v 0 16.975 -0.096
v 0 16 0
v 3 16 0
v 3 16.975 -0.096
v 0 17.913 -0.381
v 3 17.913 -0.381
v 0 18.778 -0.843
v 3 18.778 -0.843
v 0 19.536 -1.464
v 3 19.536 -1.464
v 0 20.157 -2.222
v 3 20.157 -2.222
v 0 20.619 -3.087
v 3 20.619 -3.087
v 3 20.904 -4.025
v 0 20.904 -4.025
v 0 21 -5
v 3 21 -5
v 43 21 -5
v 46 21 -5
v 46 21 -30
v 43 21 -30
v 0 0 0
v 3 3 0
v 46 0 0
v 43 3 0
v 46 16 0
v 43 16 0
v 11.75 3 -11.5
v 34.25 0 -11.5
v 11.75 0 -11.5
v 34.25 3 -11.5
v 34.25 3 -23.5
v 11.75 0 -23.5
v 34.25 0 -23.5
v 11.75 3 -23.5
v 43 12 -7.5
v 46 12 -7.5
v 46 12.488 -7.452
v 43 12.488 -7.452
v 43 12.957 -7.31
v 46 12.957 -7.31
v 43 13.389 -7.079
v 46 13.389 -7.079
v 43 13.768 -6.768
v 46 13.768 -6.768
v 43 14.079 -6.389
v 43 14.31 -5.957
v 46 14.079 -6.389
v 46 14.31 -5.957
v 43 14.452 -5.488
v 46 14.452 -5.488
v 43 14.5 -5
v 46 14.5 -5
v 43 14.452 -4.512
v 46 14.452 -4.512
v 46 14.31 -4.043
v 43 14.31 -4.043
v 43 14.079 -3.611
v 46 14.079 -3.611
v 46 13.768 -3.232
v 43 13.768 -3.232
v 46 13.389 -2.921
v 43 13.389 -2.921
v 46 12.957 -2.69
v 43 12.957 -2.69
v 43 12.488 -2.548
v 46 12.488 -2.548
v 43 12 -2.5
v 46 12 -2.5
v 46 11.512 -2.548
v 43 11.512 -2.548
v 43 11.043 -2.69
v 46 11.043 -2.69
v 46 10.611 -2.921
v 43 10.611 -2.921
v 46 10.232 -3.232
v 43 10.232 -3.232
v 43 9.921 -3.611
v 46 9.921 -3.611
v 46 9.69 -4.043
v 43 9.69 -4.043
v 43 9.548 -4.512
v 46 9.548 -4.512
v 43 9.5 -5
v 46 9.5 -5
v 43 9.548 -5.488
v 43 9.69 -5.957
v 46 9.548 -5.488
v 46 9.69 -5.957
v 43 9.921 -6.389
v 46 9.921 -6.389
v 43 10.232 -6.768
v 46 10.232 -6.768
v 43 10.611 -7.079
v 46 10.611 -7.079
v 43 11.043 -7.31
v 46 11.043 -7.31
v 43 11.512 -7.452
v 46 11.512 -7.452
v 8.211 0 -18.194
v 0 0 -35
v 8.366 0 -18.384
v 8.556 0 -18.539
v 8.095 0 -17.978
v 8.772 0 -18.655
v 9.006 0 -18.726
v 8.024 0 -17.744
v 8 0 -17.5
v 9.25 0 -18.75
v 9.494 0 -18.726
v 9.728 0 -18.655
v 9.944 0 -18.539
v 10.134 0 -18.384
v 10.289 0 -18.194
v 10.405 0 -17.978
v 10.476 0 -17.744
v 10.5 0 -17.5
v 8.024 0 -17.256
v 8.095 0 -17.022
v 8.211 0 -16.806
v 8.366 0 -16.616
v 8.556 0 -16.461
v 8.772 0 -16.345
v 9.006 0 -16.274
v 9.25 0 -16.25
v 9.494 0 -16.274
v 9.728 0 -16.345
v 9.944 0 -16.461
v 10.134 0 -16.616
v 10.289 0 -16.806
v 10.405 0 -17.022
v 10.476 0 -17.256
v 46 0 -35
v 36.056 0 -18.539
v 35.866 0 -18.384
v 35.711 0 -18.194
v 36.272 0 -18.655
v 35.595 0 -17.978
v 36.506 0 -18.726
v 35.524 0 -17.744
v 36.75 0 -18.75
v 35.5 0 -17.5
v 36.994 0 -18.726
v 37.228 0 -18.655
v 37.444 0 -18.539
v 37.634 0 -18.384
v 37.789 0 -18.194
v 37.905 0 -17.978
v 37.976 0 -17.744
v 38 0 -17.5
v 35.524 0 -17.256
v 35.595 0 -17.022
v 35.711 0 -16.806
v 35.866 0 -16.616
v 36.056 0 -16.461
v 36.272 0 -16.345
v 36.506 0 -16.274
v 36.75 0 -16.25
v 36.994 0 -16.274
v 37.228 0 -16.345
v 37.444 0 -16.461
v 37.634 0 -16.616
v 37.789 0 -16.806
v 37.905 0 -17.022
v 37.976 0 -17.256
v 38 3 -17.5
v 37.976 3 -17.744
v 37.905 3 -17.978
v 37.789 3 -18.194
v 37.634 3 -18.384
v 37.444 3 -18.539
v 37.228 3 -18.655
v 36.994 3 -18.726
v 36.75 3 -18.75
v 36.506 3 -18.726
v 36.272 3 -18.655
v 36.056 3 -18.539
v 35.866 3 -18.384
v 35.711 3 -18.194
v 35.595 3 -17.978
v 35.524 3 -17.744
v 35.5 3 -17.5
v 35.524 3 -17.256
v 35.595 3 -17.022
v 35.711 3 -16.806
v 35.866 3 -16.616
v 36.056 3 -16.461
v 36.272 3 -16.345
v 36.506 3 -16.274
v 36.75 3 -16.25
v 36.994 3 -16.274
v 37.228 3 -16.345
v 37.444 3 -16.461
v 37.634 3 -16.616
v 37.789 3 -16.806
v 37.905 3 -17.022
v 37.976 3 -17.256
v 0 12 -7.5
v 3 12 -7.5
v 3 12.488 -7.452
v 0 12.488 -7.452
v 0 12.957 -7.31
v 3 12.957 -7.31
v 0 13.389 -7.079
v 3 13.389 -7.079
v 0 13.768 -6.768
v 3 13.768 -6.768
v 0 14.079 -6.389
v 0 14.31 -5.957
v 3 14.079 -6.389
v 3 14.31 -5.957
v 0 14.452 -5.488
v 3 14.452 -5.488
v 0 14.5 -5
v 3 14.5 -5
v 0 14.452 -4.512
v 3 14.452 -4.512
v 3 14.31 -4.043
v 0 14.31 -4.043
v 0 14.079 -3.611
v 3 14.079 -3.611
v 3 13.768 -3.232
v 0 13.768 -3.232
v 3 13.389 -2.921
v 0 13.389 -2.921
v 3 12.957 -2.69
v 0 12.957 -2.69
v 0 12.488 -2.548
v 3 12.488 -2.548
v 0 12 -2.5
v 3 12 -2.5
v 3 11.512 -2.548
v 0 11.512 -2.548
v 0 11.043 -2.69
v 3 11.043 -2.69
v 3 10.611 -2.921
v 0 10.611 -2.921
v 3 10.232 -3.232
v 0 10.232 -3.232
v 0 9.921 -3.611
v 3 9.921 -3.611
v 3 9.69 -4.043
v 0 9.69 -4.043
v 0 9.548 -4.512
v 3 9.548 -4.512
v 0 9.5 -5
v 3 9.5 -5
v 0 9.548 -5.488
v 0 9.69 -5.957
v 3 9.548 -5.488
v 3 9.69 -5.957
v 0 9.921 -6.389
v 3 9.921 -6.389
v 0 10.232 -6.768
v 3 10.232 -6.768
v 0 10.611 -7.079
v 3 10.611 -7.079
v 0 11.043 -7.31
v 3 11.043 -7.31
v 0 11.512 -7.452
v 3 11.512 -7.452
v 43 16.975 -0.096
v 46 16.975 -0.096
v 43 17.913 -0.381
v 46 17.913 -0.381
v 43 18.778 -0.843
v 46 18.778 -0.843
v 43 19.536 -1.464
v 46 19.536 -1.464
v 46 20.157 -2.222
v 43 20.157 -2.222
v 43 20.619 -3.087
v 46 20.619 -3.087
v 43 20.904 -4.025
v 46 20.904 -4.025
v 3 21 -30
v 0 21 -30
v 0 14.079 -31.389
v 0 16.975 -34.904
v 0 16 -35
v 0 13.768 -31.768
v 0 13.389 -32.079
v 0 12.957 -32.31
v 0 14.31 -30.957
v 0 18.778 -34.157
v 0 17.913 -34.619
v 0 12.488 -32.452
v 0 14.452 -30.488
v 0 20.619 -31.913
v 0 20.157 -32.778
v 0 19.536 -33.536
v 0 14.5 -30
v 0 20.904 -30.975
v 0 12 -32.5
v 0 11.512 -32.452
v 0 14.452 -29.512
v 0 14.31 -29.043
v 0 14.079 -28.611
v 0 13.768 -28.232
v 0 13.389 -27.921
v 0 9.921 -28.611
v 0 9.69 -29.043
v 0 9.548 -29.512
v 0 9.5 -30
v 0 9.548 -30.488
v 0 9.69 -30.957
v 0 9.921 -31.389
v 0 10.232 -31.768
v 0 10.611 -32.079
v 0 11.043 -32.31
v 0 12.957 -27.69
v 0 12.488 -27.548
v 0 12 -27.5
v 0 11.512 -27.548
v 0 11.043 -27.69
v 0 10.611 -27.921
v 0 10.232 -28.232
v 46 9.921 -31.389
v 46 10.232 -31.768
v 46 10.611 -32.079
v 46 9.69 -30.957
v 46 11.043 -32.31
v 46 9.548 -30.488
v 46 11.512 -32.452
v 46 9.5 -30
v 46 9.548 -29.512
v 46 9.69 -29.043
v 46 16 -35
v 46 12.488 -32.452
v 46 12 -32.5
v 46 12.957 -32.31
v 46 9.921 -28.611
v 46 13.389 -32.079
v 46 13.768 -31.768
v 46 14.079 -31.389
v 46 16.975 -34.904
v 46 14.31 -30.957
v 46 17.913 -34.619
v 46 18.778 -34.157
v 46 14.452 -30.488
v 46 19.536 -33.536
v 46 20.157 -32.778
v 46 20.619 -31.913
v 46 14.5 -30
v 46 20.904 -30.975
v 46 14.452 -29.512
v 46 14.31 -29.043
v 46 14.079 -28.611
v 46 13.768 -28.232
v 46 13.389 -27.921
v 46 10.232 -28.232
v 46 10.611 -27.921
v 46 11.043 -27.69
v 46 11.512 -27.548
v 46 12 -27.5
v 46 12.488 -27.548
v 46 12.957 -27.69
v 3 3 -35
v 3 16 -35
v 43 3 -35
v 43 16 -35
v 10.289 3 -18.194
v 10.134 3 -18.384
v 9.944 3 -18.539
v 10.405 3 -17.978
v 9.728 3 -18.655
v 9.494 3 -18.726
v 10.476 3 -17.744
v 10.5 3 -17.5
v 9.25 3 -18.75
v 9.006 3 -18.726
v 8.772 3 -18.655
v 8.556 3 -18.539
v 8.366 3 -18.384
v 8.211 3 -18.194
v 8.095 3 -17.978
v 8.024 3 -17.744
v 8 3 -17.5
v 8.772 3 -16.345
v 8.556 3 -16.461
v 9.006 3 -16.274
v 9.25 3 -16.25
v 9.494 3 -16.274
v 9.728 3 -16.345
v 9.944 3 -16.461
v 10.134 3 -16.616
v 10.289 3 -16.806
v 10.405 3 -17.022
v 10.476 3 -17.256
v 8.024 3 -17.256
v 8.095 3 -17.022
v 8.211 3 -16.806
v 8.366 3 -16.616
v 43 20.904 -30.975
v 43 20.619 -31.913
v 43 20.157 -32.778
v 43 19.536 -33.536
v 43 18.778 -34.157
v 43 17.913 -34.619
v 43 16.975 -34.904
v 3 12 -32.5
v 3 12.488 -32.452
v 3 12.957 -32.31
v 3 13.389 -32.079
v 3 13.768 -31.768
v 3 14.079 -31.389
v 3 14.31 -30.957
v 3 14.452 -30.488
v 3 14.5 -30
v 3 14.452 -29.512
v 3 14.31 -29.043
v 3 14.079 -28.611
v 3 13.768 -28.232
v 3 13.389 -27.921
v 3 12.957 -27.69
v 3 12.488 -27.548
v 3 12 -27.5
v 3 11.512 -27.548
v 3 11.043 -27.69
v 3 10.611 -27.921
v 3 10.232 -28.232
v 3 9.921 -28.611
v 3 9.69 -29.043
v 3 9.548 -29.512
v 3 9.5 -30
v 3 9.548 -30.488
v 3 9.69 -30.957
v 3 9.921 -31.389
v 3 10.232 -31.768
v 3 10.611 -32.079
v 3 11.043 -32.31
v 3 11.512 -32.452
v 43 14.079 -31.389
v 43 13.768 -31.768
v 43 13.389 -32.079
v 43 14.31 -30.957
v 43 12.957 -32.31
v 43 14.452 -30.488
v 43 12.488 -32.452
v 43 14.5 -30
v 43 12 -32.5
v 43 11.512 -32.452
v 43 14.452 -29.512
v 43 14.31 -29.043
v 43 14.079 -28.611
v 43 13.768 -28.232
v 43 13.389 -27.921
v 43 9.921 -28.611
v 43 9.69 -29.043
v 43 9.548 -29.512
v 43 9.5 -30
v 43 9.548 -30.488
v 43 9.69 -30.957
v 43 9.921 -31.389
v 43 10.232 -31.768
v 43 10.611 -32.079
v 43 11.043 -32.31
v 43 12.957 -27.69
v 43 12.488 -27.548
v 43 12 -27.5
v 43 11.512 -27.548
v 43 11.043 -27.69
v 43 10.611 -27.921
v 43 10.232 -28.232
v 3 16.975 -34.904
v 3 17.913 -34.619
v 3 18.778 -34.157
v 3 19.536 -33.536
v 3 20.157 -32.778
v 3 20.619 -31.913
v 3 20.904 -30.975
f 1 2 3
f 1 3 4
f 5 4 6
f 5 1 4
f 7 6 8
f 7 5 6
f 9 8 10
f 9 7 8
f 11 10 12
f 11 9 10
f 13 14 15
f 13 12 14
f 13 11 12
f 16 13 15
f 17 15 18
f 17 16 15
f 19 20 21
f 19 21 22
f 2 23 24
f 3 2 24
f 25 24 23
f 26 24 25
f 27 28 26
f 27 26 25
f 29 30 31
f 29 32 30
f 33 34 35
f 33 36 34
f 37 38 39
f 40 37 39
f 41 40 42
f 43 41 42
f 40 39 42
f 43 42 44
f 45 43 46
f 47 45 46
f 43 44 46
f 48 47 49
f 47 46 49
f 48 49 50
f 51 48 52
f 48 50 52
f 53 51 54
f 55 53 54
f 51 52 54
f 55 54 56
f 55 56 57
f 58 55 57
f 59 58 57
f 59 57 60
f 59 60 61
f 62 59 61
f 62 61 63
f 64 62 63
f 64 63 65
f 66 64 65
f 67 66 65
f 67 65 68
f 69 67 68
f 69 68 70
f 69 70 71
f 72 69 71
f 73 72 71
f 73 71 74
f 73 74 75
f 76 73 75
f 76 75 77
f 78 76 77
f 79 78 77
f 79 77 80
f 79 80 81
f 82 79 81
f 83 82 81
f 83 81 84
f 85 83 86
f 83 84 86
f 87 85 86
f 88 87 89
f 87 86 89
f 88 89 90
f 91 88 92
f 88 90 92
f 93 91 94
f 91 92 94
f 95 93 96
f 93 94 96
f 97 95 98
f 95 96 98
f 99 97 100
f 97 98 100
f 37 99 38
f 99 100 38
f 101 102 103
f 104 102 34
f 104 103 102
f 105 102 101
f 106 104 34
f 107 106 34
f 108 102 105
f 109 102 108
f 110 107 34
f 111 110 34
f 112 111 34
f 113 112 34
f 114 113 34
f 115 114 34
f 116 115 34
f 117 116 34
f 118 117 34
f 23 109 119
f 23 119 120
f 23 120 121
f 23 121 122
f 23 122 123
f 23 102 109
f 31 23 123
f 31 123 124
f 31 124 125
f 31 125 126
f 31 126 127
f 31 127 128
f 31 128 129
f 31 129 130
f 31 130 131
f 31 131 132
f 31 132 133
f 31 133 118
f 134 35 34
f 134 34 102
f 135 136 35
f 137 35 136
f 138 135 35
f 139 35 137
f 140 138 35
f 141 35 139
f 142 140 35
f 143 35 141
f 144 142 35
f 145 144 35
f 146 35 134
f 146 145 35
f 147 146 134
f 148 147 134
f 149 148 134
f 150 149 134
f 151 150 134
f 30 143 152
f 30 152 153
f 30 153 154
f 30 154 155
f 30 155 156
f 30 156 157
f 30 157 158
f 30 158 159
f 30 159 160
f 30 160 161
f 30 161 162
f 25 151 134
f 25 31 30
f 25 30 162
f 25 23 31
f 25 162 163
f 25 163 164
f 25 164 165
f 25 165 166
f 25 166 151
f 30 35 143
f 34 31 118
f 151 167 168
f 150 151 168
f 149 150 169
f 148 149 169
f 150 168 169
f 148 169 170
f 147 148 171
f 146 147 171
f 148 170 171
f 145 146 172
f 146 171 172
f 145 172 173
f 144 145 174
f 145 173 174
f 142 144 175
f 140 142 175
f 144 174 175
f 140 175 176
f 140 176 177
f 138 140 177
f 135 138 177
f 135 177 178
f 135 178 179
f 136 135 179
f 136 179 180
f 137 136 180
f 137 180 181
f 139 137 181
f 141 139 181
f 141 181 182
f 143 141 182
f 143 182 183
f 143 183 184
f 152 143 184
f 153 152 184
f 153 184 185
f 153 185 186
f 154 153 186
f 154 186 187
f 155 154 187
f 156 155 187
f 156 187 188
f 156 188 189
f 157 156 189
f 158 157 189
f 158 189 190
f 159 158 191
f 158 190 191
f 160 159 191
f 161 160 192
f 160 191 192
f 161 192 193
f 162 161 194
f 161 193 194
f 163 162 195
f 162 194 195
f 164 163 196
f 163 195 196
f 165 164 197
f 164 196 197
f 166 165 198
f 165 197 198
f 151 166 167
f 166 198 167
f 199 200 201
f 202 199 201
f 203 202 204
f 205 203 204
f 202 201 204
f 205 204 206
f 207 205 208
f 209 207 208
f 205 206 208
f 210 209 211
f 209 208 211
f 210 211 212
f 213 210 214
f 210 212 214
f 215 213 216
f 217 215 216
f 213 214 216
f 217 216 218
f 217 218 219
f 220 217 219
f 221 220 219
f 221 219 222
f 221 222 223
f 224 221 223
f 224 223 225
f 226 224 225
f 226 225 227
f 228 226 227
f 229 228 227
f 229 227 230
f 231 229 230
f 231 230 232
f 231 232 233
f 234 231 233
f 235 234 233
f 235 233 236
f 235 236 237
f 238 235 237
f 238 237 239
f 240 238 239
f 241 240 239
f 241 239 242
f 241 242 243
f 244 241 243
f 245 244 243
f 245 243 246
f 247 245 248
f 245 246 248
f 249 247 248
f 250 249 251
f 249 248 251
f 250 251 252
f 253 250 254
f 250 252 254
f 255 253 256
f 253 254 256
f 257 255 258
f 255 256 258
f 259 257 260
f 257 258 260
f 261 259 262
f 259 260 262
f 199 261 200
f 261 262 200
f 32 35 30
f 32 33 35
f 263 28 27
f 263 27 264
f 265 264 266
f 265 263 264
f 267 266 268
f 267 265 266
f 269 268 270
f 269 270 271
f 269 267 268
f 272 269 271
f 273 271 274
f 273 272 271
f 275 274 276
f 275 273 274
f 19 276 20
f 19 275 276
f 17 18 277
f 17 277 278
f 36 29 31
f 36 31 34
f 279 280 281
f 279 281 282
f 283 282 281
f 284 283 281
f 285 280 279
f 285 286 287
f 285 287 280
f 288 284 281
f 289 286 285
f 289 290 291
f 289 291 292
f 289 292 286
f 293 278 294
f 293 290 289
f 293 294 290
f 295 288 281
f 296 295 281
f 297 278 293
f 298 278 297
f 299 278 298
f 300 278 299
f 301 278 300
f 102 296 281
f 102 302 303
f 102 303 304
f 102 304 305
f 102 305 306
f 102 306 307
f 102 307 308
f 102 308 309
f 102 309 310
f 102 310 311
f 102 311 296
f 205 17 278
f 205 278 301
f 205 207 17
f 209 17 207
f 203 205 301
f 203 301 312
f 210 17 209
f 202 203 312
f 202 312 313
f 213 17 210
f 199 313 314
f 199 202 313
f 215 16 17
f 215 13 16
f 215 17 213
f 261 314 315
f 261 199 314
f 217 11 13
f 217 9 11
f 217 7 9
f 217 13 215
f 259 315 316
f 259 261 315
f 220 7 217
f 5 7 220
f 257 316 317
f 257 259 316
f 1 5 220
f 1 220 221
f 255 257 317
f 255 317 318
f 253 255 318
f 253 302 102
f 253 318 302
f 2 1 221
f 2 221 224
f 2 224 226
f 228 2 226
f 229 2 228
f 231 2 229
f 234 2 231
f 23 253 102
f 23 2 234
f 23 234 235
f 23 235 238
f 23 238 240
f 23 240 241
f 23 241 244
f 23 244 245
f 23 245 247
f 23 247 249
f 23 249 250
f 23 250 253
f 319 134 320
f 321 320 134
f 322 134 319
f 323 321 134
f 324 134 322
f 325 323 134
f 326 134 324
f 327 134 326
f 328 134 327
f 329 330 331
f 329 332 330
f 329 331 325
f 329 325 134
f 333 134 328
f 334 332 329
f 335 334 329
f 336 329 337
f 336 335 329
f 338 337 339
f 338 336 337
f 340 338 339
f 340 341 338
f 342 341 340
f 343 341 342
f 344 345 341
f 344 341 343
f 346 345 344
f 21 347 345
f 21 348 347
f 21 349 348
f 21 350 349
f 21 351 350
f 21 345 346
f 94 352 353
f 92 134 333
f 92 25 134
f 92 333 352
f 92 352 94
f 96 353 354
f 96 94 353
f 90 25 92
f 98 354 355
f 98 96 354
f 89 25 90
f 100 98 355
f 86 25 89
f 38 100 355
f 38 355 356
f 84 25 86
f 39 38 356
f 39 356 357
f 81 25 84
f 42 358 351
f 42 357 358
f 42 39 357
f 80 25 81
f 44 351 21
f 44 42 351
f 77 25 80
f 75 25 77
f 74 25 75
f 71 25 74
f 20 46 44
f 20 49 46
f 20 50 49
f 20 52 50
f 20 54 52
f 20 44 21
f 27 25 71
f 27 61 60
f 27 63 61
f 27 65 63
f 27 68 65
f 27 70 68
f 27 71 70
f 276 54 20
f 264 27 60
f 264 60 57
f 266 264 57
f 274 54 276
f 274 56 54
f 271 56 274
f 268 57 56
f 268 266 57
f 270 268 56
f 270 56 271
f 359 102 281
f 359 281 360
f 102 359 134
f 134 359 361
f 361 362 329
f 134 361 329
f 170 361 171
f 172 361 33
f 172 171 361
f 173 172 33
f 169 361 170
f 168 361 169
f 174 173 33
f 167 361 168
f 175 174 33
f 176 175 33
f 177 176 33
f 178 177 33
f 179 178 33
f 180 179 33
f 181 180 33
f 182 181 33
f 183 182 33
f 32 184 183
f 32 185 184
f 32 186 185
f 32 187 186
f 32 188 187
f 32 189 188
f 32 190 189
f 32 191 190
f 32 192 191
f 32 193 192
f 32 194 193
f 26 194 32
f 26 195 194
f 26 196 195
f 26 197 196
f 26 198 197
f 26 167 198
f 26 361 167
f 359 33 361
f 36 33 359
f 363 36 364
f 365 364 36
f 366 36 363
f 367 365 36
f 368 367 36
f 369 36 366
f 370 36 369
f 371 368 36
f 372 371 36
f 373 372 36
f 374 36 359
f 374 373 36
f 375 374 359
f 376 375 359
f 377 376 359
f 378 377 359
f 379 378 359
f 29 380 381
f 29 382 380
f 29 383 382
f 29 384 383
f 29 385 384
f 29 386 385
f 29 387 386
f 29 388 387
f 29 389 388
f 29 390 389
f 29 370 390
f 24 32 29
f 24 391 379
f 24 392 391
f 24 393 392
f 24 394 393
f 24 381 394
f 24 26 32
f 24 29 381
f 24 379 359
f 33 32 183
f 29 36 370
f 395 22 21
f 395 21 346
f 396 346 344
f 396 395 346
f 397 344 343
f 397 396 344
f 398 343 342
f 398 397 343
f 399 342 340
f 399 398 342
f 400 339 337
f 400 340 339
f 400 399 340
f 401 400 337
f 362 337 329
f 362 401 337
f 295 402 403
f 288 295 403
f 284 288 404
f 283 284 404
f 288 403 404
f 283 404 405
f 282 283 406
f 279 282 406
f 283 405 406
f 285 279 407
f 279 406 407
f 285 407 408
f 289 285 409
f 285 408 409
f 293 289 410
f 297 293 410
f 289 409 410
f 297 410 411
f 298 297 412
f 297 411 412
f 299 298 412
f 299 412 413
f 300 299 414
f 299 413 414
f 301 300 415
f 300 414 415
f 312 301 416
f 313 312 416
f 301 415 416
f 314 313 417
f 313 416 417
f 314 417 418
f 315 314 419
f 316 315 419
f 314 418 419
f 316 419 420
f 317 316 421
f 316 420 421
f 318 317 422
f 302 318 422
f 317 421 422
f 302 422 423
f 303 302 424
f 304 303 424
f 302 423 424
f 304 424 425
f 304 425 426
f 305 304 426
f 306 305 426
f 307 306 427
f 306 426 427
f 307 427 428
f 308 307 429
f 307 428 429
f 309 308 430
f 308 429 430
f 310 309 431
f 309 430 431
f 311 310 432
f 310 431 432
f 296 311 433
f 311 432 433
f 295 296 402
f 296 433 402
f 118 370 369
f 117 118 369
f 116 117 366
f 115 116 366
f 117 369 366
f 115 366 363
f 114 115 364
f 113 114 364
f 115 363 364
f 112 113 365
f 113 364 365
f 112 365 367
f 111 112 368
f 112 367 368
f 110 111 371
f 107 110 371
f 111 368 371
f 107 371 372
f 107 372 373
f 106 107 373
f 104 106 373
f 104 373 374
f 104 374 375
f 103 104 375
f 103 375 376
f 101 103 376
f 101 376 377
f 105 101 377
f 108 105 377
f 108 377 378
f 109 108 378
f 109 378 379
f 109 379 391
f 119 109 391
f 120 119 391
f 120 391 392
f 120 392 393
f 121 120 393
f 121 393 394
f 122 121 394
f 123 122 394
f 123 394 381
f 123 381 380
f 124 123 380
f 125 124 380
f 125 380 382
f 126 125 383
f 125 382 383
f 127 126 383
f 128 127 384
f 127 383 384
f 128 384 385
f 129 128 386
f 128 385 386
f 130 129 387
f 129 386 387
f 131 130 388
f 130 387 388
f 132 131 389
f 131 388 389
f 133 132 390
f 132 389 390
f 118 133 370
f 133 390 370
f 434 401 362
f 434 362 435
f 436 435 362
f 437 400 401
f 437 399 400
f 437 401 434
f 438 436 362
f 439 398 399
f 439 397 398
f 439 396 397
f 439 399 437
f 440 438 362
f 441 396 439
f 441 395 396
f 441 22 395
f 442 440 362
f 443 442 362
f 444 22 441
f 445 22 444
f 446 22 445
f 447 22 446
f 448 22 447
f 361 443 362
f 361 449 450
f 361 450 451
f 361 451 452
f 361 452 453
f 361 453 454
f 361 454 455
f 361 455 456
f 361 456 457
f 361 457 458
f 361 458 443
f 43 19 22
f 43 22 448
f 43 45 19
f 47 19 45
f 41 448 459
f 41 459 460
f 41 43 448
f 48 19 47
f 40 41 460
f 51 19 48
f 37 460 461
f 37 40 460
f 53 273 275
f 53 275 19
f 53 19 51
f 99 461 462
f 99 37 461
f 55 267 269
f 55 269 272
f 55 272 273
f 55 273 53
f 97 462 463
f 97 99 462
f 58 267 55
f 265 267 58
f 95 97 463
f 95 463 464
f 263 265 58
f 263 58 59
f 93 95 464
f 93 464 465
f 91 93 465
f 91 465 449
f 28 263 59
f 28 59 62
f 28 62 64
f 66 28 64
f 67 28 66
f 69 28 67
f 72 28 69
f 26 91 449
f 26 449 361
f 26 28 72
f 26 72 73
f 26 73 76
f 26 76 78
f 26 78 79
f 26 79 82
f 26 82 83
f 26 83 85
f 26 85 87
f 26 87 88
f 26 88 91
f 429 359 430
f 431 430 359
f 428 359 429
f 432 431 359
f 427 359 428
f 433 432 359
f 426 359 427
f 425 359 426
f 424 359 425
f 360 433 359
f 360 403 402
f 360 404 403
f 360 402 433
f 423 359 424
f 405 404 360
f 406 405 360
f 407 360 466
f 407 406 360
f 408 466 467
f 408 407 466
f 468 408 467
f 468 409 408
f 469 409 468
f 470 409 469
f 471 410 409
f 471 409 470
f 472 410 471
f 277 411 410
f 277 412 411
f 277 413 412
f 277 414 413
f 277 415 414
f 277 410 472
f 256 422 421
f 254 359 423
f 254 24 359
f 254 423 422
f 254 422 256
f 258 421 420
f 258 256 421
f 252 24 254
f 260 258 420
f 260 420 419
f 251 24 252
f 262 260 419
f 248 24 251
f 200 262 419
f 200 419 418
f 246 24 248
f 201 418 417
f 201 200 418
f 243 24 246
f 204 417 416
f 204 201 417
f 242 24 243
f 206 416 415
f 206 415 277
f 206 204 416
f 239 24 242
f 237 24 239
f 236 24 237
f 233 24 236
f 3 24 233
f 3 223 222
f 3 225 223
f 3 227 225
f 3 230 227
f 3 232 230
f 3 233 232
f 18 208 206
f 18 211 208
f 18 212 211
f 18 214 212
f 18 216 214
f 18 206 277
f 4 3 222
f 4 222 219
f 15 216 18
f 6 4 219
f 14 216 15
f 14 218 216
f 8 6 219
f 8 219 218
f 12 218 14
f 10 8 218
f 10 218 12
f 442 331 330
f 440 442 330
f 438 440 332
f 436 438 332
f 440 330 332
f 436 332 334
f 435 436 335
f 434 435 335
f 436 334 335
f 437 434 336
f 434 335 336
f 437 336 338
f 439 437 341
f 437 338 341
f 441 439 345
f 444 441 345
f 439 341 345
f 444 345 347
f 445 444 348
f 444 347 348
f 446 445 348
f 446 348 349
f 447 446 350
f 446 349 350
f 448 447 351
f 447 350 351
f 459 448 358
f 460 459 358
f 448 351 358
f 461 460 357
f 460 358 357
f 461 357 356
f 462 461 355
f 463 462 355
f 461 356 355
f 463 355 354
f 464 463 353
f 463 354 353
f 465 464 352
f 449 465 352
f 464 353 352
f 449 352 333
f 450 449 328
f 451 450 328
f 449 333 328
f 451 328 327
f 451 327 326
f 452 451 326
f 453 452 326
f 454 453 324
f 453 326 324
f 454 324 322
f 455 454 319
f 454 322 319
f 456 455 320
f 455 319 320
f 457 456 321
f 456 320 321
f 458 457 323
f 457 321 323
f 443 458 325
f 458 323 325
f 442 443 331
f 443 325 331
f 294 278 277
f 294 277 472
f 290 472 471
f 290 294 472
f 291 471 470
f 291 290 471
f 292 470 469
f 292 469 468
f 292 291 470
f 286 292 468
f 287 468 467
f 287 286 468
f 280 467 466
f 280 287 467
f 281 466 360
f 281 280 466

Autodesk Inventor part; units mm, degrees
ref_plane "YZ Plane" through (0, 0, 0) normal (1, 0, 0) x (0, 1, 0)
ref_plane "XZ Plane" through (0, 0, 0) normal (0, 1, 0) x (-1, 0, 0)
ref_plane "XY Plane" through (0, 0, 0) normal (0, 0, 1) x (1, 0, 0)
sketch "Boceto1" plane through (0, 0, 0) normal (0, 0, 1) x (1, 0, 0)
  line L0 (0, 0) -> (46, 0)
  line L1 (46, 0) -> (46, 21)
  line L2 (46, 21) -> (43, 21)
  line L3 (43, 21) -> (43, 3)
  line L4 (43, 3) -> (3, 3)
  line L5 (3, 3) -> (3, 21)
  line L6 (3, 21) -> (0, 21)
  line L7 (0, 21) -> (0, 0)
extrude "Extrusión1" add sketch "Boceto1" against normal blind 35
sketch "Boceto2" plane through (46, 0, 0) normal (1, 0, 0) x (0, 0, -1)
  circle A0 centre (5, 12) radius 2.5
  circle A1 centre (30, 12) radius 2.5
extrude "Extrusión2" cut sketch "Boceto2" against normal blind 60 contours A0
extrude "Extrusión3" cut sketch "Boceto2" against normal blind 60 contours A1
fillet "Empalme1" radius 5 4 edges at (1.5, 21, 0) (1.5, 21, -35) (44.5, 21, 0) (44.5, 21, -35)
sketch "Boceto3" plane through (3, 3, 0) normal (0, 1, 0) x (1, 0, 0)
  line L0 (8.75, 23.5) -> (31.25, 23.5)
  line L1 (31.25, 23.5) -> (31.25, 11.5)
  line L2 (31.25, 11.5) -> (8.75, 11.5)
  line L3 (8.75, 11.5) -> (8.75, 23.5)
  line L4 (8.75, 23.5) -> (8.75, 17.5)
  circle A0 centre (6.25, 17.5) radius 1.25
  line L5 (31.25, 23.5) -> (31.25, 17.5)
  circle A1 centre (33.75, 17.5) radius 1.25
  point P0 (-3, 0)
  point P1 (0, 35)
extrude "Extrusión4" cut sketch "Boceto3" against normal blind 60 contours L0 L1 L2 L3
extrude "Extrusión5" cut sketch "Boceto3" against normal blind 60 contours A0 | A1
properties part number "8_1"
